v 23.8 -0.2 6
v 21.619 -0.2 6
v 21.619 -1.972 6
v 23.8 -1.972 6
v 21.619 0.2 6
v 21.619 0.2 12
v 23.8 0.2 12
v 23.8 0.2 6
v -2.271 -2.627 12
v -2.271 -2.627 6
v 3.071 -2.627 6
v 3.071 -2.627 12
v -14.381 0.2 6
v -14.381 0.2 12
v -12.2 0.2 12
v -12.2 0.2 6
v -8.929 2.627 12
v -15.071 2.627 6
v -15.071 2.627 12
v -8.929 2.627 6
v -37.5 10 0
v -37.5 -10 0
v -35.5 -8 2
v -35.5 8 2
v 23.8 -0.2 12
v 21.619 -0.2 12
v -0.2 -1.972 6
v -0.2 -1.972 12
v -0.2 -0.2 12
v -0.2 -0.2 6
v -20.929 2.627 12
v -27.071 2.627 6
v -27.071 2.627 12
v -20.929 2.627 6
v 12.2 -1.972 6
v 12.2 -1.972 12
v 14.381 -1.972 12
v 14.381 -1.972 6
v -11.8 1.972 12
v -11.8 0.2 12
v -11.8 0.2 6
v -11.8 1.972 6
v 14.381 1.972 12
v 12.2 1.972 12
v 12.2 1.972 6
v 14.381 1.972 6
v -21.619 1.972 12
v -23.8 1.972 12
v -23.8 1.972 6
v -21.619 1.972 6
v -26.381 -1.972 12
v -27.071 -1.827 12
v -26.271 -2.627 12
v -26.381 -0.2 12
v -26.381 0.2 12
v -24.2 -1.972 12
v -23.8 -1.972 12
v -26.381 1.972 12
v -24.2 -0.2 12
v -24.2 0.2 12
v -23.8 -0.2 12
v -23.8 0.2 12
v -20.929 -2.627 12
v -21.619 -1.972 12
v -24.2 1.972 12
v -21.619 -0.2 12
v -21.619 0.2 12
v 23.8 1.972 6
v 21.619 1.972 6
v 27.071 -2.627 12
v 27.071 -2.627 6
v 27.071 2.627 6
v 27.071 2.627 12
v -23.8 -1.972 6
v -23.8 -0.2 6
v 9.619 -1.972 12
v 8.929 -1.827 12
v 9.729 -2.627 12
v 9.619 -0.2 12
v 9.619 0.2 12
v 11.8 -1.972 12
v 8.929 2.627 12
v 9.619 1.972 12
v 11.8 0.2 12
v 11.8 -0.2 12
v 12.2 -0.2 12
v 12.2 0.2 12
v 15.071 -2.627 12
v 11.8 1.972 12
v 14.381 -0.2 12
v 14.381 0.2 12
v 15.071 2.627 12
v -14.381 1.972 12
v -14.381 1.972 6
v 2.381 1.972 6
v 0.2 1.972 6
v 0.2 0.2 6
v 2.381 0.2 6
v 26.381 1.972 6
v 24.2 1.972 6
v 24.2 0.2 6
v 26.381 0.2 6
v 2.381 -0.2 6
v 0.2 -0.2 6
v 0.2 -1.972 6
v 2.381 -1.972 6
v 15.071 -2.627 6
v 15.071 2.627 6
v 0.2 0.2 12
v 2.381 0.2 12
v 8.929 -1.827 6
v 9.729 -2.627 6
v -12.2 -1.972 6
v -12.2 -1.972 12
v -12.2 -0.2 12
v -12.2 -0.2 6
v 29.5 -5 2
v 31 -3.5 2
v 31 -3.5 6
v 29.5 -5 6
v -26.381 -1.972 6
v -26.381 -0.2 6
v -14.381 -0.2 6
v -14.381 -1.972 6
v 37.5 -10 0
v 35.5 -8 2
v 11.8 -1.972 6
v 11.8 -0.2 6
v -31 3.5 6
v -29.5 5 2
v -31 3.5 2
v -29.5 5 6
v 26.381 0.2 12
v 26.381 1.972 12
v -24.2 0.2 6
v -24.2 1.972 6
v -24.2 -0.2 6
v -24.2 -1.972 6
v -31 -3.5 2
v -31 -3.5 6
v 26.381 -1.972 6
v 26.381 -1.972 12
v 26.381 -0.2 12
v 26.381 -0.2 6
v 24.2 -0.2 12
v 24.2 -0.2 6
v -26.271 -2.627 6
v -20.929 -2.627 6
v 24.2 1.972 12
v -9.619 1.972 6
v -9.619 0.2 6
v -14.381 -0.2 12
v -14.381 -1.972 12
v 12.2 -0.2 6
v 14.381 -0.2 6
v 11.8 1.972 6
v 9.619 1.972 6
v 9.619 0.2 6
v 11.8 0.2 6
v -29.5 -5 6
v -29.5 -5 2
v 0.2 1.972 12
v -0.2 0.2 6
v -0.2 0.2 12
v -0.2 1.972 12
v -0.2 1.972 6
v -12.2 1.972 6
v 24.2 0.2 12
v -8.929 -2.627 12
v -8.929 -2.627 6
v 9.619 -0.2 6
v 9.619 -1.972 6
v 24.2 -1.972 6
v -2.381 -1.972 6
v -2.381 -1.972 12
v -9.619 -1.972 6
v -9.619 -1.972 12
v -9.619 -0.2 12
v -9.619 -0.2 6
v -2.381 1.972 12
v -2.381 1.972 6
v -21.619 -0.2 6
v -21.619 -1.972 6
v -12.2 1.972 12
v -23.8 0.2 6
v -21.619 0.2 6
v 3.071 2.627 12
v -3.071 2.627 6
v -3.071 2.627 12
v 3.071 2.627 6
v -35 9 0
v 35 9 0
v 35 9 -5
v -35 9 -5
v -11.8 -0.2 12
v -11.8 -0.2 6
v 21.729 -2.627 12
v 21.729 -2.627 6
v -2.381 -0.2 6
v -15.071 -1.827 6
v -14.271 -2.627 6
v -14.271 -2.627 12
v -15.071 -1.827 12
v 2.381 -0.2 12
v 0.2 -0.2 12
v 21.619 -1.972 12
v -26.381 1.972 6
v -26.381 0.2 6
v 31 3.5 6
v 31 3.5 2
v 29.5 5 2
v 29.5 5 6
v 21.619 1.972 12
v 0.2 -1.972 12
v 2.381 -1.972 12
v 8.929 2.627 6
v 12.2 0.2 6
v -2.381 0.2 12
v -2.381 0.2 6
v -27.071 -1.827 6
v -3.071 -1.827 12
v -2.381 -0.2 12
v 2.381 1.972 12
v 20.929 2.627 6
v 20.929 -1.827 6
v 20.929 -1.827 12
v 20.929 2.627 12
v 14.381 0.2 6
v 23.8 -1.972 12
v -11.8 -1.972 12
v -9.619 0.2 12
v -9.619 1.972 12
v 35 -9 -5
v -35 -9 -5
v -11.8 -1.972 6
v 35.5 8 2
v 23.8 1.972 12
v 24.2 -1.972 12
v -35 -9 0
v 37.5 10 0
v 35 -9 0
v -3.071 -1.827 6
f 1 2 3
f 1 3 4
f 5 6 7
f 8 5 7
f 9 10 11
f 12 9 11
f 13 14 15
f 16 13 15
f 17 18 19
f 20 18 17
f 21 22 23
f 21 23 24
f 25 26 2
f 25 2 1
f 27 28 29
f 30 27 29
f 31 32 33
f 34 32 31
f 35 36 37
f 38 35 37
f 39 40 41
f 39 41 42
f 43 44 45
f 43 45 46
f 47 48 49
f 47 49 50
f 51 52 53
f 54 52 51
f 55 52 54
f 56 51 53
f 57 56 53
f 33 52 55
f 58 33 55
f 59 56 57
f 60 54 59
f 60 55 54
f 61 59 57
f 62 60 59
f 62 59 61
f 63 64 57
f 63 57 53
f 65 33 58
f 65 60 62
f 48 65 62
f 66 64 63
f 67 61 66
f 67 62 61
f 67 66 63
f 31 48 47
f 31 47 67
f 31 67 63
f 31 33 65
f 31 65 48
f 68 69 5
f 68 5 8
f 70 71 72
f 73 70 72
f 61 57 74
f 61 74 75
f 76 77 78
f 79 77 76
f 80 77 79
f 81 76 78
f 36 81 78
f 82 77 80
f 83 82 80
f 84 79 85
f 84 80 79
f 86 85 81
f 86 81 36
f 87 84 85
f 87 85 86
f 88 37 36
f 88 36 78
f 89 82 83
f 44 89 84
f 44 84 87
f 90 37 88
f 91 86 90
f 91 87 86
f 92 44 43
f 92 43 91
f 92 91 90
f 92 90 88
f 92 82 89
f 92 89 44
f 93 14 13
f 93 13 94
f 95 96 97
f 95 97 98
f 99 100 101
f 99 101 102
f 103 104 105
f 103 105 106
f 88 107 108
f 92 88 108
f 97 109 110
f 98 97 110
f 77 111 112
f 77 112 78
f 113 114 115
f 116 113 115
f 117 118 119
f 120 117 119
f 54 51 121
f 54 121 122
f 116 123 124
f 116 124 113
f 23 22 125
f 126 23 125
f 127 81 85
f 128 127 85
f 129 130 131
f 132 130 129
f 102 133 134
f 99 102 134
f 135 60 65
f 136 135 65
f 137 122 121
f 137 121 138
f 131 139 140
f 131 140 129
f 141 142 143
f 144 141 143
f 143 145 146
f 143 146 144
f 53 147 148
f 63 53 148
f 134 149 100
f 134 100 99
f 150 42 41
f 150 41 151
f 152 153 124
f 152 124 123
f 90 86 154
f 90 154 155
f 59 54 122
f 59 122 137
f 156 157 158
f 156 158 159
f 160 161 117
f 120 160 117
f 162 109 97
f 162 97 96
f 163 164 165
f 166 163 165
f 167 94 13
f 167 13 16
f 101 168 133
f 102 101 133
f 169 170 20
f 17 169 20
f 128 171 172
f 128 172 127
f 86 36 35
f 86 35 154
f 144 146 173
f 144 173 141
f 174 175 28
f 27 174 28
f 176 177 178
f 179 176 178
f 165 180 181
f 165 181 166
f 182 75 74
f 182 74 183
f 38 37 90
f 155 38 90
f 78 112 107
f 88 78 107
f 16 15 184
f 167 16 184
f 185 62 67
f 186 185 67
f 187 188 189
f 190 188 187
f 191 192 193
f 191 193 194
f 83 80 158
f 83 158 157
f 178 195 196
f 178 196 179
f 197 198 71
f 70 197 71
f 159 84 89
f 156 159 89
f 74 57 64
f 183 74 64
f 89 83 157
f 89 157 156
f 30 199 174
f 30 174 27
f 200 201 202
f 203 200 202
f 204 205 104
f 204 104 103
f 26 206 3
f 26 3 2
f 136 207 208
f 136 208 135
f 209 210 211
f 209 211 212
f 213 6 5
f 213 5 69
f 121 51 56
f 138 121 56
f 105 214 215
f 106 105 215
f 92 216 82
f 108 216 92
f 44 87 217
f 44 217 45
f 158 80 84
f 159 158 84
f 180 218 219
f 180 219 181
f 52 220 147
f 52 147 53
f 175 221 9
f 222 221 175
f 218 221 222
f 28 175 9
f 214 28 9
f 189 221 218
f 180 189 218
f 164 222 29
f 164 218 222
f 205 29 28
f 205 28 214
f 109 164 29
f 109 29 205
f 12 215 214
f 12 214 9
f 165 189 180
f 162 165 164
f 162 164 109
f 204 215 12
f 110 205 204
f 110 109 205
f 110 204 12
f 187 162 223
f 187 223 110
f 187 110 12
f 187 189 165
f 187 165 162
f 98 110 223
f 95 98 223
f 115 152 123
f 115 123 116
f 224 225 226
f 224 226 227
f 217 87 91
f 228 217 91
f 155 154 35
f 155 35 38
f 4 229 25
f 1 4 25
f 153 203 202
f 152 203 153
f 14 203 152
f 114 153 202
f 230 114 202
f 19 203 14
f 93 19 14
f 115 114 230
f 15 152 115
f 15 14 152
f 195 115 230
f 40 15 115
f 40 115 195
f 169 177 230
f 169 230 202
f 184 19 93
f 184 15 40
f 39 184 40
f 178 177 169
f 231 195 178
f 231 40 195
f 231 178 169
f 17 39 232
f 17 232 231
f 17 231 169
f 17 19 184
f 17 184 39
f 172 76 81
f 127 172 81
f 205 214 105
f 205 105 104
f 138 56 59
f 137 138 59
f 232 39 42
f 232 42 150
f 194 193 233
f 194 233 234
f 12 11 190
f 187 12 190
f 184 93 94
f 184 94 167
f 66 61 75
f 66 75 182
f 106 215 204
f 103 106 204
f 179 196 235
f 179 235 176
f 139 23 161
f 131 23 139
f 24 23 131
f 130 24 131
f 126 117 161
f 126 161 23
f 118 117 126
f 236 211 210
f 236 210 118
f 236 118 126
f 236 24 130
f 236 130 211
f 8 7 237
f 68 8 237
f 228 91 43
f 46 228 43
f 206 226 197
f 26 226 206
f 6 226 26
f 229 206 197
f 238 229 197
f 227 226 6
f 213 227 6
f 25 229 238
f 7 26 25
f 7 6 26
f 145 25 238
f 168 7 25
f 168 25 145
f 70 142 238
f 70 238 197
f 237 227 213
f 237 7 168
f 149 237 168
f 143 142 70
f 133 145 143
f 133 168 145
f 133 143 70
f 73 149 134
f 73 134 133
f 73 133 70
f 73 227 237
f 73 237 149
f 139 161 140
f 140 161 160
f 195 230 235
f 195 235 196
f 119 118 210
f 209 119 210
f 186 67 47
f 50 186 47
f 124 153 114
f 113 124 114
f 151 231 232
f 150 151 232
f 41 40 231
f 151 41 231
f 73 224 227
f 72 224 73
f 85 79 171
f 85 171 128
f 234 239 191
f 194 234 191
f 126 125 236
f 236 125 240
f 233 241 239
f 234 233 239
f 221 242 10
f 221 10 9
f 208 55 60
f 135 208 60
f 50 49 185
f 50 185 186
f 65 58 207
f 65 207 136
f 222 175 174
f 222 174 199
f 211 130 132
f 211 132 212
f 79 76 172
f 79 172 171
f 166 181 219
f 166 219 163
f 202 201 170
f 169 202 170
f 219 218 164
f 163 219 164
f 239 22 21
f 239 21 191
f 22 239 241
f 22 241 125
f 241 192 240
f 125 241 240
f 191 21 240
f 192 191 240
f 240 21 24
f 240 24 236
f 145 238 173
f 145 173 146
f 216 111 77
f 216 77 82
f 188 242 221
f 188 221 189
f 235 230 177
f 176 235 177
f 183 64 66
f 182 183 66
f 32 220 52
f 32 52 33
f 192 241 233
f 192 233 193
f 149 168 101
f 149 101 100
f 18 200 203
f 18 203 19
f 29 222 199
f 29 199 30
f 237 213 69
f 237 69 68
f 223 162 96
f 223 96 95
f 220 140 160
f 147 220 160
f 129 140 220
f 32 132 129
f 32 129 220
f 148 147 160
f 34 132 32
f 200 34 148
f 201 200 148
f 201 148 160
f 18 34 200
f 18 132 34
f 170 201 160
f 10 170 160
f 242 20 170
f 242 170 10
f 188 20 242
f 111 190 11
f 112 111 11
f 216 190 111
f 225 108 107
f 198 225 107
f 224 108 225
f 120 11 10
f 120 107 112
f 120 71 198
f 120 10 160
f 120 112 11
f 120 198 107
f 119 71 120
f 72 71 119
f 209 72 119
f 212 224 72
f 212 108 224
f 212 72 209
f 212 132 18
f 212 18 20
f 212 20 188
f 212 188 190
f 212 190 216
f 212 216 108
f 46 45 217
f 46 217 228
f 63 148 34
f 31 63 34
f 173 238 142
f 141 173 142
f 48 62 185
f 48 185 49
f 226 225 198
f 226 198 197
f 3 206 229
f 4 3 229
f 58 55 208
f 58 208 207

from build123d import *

# Parameters (mm, degrees)
SKETCH1_W            = 75
SKETCH1_H            = 20
BOSS_EXTRUDE1_DEPTH  = 2
SKETCH2_W            = 62
SKETCH2_H            = 10
BOSS_EXTRUDE2_DEPTH  = 4
SKETCH3_W            = 70
SKETCH3_H            = 18
BOSS_EXTRUDE3_DEPTH  = 5
SKETCH4_W            = 6.142437882
SKETCH4_H            = 5.25340082
BOSS_EXTRUDE4_DEPTH  = 6
SKETCH6_W            = 2.181176029
SKETCH6_H            = 1.77174688
CUT_EXTRUDE1_DEPTH   = 6
LPATTERN1_COUNT      = 3
LPATTERN1_PITCH      = 12
LPATTERN1_COUNT_DIR2 = 3
LPATTERN1_PITCH_DIR2 = 12
CHAMFER1_SIZE        = 0.8
CHAMFER2_SIZE        = 1.5
CHAMFER4_SIZE        = 2


with BuildPart() as part:
    # Sketch1 → Boss-Extrude1 (new body)
    with BuildSketch(Plane.XY):
        Rectangle(SKETCH1_W, SKETCH1_H)
    extrude(amount=BOSS_EXTRUDE1_DEPTH)

    # Sketch2 → Boss-Extrude2 (add)
    with BuildSketch(Plane.XY.offset(2)):
        Rectangle(SKETCH2_W, SKETCH2_H)
    extrude(amount=BOSS_EXTRUDE2_DEPTH)

    # Sketch3 → Boss-Extrude3 (add)
    with BuildSketch(Plane(origin=(0, 0, 0), x_dir=(-1, 0, 0), z_dir=(0, 0, -1))):
        Rectangle(SKETCH3_W, SKETCH3_H)
    extrude(amount=BOSS_EXTRUDE3_DEPTH)

    # Sketch4 → Boss-Extrude4 (add)
    with BuildSketch(Plane.XY.offset(6)):
        Rectangle(SKETCH4_W, SKETCH4_H)
    boss_extrude4 = extrude(amount=BOSS_EXTRUDE4_DEPTH)

    # Sketch6 → Cut-Extrude1 (cut)
    with BuildSketch(Plane.XY.offset(12)):
        with Locations((1.290588015, 1.08587344)):
            Rectangle(SKETCH6_W, SKETCH6_H)
        with Locations((-1.290588015, 1.08587344)):
            Rectangle(SKETCH6_W, SKETCH6_H)
        with Locations((-1.290588015, -1.08587344)):
            Rectangle(SKETCH6_W, SKETCH6_H)
        with Locations((1.290588015, -1.08587344)):
            Rectangle(SKETCH6_W, SKETCH6_H)
    cut_extrude1 = extrude(amount=-CUT_EXTRUDE1_DEPTH, mode=Mode.SUBTRACT)

    # LPattern1: Boss-Extrude4, Cut-Extrude1 3 × 3
    with Locations(*[Vector(1, 0, 0) * (i * LPATTERN1_PITCH) + Vector(-1, 0, 0) * (j * LPATTERN1_PITCH_DIR2) for i in range(LPATTERN1_COUNT) for j in range(LPATTERN1_COUNT_DIR2) if (i, j) != (0, 0)]):
        add(boss_extrude4)
        add(cut_extrude1, mode=Mode.SUBTRACT)

    # Chamfer1
    chamfer1_edges = [part.edges().sort_by_distance(p)[0] for p in [
        (-15.071218941, -2.62670041, 9),
        (-27.071218941, -2.62670041, 9),
        (8.928781059, -2.62670041, 9),
        (20.928781059, -2.62670041, 9),
        (-3.071218941, -2.62670041, 9),
    ]]
    chamfer(chamfer1_edges, length=CHAMFER1_SIZE)

    # Chamfer2
    chamfer2_edges = [part.edges().sort_by_distance(p)[0] for p in [
        (31, -5, 4),
        (31, 5, 4),
        (-31, 5, 4),
        (-31, -5, 4),
    ]]
    chamfer(chamfer2_edges, length=CHAMFER2_SIZE)

    # Chamfer4
    chamfer4_edges = [part.edges().sort_by_distance(p)[0] for p in [
        (0, 10, 2),
        (37.5, 0, 2),
        (0, -10, 2),
        (-37.5, 0, 2),
    ]]
    chamfer(chamfer4_edges, length=CHAMFER4_SIZE - 0.0001)  # a hair under: the kernel refuses the full size


solid = part.part
